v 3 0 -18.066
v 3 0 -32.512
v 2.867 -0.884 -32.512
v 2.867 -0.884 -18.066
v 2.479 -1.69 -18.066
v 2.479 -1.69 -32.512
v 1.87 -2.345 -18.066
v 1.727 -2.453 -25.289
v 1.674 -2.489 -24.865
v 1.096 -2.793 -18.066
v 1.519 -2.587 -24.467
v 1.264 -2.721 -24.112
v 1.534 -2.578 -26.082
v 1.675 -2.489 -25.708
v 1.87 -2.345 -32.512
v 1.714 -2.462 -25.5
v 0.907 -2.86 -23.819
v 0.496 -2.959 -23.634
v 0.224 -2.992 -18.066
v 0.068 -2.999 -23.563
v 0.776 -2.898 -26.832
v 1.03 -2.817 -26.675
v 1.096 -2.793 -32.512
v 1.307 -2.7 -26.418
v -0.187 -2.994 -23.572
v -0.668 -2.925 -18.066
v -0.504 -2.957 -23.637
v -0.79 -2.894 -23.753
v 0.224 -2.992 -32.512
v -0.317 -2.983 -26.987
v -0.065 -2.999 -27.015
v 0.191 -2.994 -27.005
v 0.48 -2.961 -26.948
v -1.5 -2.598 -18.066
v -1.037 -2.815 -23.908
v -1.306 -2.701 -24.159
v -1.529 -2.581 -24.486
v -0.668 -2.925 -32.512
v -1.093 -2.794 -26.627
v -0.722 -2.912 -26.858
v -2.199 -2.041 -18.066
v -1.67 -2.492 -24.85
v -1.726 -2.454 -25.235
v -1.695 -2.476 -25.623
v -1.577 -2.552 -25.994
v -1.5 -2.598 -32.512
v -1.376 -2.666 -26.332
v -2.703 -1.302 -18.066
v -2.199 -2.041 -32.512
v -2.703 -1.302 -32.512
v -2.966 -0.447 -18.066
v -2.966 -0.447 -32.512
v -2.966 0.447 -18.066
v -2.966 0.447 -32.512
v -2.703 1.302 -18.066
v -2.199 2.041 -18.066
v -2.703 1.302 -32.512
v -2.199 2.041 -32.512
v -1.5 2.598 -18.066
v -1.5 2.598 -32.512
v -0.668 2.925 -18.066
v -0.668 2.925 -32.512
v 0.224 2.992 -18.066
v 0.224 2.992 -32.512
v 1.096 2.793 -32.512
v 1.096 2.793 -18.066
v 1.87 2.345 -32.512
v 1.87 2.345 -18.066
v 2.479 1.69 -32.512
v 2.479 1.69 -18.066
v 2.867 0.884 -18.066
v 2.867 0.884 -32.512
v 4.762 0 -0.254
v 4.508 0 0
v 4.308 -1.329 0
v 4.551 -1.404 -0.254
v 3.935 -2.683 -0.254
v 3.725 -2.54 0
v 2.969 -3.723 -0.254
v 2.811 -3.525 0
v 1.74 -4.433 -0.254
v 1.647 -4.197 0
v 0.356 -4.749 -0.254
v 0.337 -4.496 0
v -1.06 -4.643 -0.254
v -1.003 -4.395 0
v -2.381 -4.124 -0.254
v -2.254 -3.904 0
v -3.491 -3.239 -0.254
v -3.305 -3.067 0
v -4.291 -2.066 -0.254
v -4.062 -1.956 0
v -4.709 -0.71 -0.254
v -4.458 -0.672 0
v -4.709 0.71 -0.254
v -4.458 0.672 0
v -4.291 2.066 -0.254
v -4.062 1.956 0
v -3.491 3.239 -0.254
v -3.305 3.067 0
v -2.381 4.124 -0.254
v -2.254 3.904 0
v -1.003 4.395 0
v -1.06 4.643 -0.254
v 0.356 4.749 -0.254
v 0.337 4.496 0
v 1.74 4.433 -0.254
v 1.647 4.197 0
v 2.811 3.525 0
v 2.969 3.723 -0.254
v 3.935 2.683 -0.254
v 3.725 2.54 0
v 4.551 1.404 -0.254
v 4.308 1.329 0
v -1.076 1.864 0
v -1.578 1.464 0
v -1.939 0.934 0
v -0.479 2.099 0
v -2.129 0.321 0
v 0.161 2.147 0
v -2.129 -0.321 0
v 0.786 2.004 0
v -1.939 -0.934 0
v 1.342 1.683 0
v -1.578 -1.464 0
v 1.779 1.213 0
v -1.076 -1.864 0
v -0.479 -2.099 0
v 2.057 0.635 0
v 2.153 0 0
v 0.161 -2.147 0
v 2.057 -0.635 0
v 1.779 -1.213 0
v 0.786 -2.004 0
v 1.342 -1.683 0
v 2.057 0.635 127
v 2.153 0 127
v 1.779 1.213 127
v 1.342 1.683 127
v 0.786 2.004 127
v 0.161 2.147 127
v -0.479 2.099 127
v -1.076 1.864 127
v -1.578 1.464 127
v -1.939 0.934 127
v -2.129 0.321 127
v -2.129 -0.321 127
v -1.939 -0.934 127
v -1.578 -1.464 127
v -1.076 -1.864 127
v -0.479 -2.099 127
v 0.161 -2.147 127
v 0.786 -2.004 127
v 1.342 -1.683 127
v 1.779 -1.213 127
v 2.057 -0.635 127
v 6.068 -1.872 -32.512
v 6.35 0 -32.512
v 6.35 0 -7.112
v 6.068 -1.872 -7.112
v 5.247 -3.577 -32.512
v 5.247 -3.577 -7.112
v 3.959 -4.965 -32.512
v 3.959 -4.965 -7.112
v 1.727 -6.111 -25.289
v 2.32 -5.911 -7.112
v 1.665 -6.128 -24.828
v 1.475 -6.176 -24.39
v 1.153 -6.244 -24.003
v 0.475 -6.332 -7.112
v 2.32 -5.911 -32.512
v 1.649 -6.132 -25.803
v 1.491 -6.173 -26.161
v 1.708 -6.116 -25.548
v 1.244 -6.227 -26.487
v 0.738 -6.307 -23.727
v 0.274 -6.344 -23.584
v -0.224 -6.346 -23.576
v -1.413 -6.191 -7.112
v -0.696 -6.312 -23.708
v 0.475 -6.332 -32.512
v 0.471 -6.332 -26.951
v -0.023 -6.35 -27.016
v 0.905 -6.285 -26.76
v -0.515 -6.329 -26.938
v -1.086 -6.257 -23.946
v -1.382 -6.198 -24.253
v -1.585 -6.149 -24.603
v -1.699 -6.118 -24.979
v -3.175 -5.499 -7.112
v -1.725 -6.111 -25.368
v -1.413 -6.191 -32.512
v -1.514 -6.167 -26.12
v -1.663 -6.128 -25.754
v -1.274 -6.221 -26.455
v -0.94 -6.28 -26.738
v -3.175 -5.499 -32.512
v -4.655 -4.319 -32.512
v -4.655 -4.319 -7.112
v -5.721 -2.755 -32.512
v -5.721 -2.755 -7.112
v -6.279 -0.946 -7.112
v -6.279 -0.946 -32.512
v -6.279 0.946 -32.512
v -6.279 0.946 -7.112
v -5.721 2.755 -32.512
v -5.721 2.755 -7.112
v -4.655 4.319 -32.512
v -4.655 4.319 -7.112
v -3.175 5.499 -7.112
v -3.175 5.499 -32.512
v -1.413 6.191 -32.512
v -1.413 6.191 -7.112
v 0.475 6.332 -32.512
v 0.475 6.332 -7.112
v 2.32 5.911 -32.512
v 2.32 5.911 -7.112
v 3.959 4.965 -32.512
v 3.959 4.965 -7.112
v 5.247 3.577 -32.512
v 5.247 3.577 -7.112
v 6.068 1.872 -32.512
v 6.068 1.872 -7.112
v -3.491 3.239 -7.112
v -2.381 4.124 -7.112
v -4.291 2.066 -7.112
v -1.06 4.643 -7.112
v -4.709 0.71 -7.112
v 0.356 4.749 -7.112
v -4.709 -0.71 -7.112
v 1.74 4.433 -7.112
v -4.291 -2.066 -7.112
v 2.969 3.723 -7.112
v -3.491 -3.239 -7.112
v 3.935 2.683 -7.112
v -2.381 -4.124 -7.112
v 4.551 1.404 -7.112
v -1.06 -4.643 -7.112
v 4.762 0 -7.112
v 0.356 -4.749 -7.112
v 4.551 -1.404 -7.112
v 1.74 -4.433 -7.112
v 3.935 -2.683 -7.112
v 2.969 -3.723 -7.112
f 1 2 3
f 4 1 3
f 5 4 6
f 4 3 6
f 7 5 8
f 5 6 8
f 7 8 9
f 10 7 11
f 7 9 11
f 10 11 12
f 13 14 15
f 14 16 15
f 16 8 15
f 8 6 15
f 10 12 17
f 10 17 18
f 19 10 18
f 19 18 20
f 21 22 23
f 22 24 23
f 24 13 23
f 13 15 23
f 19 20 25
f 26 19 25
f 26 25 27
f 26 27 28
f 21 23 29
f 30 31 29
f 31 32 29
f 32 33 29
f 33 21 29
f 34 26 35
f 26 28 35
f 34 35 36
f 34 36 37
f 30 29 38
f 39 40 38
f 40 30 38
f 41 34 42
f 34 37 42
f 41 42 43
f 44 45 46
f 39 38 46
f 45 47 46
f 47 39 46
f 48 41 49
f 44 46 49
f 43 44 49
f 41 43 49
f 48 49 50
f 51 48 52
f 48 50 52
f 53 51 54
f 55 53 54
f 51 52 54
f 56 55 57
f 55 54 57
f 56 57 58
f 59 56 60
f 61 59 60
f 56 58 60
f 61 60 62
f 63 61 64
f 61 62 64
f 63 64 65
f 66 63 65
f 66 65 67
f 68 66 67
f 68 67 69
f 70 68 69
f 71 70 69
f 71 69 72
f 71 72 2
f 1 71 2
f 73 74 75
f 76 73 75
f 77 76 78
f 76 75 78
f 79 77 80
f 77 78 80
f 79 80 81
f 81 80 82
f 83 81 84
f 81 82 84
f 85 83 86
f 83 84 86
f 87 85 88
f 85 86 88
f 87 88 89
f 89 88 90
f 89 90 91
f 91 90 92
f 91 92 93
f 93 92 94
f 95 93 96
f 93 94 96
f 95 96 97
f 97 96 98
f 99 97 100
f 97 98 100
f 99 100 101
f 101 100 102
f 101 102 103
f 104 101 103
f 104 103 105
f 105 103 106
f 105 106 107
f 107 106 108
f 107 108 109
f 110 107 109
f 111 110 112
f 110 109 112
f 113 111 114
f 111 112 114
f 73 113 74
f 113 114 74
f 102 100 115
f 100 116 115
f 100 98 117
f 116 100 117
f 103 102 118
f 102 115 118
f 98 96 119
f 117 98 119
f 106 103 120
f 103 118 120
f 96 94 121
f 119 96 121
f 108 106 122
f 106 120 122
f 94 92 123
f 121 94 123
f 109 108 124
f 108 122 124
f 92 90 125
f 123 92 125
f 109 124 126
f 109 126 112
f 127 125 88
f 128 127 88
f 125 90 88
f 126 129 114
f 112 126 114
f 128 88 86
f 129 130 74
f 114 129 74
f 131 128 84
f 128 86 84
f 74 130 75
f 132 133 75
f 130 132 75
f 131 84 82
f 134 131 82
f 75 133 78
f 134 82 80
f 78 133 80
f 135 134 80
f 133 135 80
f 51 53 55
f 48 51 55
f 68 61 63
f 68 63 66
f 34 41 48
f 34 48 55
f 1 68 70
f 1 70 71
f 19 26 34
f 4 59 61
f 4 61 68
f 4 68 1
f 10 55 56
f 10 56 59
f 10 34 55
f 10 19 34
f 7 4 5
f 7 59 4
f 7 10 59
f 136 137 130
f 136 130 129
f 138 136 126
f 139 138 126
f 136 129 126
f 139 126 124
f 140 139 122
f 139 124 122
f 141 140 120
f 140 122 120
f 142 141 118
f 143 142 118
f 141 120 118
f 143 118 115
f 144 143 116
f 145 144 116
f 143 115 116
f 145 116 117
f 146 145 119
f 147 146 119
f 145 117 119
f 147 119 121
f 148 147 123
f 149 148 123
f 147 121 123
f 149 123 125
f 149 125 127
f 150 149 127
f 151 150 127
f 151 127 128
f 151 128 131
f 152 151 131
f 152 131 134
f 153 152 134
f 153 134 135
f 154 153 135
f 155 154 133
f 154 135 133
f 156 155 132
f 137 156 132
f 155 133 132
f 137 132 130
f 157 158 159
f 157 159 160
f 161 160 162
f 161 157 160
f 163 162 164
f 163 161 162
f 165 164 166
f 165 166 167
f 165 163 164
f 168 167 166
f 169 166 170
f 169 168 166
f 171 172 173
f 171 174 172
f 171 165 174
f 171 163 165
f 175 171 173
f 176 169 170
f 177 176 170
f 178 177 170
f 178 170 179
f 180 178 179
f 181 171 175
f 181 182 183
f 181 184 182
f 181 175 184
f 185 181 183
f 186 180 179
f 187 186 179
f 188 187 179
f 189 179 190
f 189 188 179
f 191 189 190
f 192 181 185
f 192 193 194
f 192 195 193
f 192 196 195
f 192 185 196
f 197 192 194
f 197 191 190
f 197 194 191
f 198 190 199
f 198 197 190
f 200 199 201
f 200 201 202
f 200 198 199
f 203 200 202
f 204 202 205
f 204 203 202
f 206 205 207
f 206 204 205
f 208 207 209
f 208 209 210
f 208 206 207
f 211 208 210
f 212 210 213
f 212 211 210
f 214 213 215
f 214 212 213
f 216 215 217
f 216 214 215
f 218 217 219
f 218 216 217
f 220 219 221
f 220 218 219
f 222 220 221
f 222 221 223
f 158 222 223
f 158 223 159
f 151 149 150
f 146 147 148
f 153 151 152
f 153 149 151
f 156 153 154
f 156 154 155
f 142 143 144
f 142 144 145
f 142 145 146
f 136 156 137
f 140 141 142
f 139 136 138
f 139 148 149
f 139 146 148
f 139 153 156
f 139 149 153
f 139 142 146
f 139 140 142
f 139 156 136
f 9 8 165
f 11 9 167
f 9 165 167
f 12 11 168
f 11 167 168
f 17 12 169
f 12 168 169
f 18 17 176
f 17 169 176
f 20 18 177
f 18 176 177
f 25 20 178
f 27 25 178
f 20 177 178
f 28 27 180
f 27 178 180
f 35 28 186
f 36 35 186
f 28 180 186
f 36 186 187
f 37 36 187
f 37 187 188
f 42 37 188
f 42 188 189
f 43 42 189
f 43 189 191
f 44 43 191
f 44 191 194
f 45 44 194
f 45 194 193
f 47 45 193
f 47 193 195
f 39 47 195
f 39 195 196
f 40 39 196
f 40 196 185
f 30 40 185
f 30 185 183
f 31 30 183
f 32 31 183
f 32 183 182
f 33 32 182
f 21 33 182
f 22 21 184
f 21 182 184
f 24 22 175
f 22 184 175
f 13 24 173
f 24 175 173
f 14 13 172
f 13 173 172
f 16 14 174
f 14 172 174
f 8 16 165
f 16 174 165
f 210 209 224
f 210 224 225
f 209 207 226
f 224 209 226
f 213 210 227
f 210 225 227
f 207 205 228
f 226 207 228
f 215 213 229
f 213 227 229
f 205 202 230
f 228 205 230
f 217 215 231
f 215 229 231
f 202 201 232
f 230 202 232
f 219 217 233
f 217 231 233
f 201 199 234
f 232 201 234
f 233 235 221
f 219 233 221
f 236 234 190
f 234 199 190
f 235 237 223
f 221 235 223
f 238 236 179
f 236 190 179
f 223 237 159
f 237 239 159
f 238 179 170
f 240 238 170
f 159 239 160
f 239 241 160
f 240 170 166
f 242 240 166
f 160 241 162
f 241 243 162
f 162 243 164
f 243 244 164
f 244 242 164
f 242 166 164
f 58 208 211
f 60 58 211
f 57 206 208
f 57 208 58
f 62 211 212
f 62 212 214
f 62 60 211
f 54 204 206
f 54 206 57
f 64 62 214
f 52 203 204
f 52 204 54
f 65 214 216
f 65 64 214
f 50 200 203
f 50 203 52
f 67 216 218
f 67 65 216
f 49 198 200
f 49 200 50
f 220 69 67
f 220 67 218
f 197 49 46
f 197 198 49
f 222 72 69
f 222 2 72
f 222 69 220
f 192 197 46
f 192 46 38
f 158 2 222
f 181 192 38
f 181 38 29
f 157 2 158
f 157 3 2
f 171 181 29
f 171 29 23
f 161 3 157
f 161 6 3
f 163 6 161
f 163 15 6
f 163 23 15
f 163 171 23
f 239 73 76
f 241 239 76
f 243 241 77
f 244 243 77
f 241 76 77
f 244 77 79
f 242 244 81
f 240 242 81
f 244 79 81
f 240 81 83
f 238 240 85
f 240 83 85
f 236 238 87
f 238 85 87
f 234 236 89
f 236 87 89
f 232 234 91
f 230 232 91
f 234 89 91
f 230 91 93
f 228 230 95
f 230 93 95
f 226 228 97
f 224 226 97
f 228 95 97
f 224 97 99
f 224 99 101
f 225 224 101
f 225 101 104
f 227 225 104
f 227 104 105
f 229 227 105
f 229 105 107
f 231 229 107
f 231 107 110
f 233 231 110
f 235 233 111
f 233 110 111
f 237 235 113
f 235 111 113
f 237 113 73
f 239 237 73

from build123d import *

# Parameters (mm, degrees)
F0_R      = 2.15265
F1_DEPTH  = 127
F2_R      = 4.7625
F3_DEPTH  = 7.112
F4_W      = 50.8
F4_H      = 50.8
F5_DEPTH  = 25.4
F6_R      = 3
F7_DEPTH  = 14.44625
F8_R      = 1.7272
F9_DEPTH  = 23.9470875132
F10_W     = 50.8
F10_H     = 50.8
F10_R     = 6.35
F11_DEPTH = 25.4
F12_SIZE  = 0.254


with BuildPart() as f1:
    # F0 (on Top) → F1 (new body)
    with BuildSketch(Plane.XY):
        Circle(F0_R)
    extrude(amount=F1_DEPTH)

    # F2 (on face) → F3 (join)
    with BuildSketch(Plane(origin=(0, 0, 0), x_dir=(1, 0, 0), z_dir=(0, 0, -1))):
        Circle(F2_R)
    extrude(amount=F3_DEPTH)

    # F4 (on face) → F5 (join)
    with BuildSketch(Plane(origin=(0, 0, -7.112), x_dir=(1, 0, 0), z_dir=(0, 0, -1))):
        Rectangle(F4_W, F4_H)
    extrude(amount=F5_DEPTH)

    # F6 (on face) → F7 (cut)
    with BuildSketch(Plane(origin=(0, 0, -32.512), x_dir=(1, 0, 0), z_dir=(0, 0, -1))):
        Circle(F6_R)
    extrude(amount=-F7_DEPTH, mode=Mode.SUBTRACT)

    # F8 (on face) → F9 (cut, up to face)
    with BuildSketch(Plane.XZ.offset(25.4)):
        with Locations((0, -25.288875)):
            Circle(F8_R)
    extrude(amount=-F9_DEPTH, mode=Mode.SUBTRACT)

    # F10 (on face) → F11 (cut, through all)
    with BuildSketch(Plane(origin=(0, 0, -32.512), x_dir=(1, 0, 0), z_dir=(0, 0, -1))):
        Rectangle(F10_W, F10_H)
        Circle(F10_R, mode=Mode.SUBTRACT)
    extrude(amount=-F11_DEPTH, mode=Mode.SUBTRACT)

    # F12
    f12_edges = [f1.edges().sort_by_distance(p)[0] for p in [
        (-4.7625, 0, 0),
    ]]
    chamfer(f12_edges, length=F12_SIZE)


solid = f1.part
